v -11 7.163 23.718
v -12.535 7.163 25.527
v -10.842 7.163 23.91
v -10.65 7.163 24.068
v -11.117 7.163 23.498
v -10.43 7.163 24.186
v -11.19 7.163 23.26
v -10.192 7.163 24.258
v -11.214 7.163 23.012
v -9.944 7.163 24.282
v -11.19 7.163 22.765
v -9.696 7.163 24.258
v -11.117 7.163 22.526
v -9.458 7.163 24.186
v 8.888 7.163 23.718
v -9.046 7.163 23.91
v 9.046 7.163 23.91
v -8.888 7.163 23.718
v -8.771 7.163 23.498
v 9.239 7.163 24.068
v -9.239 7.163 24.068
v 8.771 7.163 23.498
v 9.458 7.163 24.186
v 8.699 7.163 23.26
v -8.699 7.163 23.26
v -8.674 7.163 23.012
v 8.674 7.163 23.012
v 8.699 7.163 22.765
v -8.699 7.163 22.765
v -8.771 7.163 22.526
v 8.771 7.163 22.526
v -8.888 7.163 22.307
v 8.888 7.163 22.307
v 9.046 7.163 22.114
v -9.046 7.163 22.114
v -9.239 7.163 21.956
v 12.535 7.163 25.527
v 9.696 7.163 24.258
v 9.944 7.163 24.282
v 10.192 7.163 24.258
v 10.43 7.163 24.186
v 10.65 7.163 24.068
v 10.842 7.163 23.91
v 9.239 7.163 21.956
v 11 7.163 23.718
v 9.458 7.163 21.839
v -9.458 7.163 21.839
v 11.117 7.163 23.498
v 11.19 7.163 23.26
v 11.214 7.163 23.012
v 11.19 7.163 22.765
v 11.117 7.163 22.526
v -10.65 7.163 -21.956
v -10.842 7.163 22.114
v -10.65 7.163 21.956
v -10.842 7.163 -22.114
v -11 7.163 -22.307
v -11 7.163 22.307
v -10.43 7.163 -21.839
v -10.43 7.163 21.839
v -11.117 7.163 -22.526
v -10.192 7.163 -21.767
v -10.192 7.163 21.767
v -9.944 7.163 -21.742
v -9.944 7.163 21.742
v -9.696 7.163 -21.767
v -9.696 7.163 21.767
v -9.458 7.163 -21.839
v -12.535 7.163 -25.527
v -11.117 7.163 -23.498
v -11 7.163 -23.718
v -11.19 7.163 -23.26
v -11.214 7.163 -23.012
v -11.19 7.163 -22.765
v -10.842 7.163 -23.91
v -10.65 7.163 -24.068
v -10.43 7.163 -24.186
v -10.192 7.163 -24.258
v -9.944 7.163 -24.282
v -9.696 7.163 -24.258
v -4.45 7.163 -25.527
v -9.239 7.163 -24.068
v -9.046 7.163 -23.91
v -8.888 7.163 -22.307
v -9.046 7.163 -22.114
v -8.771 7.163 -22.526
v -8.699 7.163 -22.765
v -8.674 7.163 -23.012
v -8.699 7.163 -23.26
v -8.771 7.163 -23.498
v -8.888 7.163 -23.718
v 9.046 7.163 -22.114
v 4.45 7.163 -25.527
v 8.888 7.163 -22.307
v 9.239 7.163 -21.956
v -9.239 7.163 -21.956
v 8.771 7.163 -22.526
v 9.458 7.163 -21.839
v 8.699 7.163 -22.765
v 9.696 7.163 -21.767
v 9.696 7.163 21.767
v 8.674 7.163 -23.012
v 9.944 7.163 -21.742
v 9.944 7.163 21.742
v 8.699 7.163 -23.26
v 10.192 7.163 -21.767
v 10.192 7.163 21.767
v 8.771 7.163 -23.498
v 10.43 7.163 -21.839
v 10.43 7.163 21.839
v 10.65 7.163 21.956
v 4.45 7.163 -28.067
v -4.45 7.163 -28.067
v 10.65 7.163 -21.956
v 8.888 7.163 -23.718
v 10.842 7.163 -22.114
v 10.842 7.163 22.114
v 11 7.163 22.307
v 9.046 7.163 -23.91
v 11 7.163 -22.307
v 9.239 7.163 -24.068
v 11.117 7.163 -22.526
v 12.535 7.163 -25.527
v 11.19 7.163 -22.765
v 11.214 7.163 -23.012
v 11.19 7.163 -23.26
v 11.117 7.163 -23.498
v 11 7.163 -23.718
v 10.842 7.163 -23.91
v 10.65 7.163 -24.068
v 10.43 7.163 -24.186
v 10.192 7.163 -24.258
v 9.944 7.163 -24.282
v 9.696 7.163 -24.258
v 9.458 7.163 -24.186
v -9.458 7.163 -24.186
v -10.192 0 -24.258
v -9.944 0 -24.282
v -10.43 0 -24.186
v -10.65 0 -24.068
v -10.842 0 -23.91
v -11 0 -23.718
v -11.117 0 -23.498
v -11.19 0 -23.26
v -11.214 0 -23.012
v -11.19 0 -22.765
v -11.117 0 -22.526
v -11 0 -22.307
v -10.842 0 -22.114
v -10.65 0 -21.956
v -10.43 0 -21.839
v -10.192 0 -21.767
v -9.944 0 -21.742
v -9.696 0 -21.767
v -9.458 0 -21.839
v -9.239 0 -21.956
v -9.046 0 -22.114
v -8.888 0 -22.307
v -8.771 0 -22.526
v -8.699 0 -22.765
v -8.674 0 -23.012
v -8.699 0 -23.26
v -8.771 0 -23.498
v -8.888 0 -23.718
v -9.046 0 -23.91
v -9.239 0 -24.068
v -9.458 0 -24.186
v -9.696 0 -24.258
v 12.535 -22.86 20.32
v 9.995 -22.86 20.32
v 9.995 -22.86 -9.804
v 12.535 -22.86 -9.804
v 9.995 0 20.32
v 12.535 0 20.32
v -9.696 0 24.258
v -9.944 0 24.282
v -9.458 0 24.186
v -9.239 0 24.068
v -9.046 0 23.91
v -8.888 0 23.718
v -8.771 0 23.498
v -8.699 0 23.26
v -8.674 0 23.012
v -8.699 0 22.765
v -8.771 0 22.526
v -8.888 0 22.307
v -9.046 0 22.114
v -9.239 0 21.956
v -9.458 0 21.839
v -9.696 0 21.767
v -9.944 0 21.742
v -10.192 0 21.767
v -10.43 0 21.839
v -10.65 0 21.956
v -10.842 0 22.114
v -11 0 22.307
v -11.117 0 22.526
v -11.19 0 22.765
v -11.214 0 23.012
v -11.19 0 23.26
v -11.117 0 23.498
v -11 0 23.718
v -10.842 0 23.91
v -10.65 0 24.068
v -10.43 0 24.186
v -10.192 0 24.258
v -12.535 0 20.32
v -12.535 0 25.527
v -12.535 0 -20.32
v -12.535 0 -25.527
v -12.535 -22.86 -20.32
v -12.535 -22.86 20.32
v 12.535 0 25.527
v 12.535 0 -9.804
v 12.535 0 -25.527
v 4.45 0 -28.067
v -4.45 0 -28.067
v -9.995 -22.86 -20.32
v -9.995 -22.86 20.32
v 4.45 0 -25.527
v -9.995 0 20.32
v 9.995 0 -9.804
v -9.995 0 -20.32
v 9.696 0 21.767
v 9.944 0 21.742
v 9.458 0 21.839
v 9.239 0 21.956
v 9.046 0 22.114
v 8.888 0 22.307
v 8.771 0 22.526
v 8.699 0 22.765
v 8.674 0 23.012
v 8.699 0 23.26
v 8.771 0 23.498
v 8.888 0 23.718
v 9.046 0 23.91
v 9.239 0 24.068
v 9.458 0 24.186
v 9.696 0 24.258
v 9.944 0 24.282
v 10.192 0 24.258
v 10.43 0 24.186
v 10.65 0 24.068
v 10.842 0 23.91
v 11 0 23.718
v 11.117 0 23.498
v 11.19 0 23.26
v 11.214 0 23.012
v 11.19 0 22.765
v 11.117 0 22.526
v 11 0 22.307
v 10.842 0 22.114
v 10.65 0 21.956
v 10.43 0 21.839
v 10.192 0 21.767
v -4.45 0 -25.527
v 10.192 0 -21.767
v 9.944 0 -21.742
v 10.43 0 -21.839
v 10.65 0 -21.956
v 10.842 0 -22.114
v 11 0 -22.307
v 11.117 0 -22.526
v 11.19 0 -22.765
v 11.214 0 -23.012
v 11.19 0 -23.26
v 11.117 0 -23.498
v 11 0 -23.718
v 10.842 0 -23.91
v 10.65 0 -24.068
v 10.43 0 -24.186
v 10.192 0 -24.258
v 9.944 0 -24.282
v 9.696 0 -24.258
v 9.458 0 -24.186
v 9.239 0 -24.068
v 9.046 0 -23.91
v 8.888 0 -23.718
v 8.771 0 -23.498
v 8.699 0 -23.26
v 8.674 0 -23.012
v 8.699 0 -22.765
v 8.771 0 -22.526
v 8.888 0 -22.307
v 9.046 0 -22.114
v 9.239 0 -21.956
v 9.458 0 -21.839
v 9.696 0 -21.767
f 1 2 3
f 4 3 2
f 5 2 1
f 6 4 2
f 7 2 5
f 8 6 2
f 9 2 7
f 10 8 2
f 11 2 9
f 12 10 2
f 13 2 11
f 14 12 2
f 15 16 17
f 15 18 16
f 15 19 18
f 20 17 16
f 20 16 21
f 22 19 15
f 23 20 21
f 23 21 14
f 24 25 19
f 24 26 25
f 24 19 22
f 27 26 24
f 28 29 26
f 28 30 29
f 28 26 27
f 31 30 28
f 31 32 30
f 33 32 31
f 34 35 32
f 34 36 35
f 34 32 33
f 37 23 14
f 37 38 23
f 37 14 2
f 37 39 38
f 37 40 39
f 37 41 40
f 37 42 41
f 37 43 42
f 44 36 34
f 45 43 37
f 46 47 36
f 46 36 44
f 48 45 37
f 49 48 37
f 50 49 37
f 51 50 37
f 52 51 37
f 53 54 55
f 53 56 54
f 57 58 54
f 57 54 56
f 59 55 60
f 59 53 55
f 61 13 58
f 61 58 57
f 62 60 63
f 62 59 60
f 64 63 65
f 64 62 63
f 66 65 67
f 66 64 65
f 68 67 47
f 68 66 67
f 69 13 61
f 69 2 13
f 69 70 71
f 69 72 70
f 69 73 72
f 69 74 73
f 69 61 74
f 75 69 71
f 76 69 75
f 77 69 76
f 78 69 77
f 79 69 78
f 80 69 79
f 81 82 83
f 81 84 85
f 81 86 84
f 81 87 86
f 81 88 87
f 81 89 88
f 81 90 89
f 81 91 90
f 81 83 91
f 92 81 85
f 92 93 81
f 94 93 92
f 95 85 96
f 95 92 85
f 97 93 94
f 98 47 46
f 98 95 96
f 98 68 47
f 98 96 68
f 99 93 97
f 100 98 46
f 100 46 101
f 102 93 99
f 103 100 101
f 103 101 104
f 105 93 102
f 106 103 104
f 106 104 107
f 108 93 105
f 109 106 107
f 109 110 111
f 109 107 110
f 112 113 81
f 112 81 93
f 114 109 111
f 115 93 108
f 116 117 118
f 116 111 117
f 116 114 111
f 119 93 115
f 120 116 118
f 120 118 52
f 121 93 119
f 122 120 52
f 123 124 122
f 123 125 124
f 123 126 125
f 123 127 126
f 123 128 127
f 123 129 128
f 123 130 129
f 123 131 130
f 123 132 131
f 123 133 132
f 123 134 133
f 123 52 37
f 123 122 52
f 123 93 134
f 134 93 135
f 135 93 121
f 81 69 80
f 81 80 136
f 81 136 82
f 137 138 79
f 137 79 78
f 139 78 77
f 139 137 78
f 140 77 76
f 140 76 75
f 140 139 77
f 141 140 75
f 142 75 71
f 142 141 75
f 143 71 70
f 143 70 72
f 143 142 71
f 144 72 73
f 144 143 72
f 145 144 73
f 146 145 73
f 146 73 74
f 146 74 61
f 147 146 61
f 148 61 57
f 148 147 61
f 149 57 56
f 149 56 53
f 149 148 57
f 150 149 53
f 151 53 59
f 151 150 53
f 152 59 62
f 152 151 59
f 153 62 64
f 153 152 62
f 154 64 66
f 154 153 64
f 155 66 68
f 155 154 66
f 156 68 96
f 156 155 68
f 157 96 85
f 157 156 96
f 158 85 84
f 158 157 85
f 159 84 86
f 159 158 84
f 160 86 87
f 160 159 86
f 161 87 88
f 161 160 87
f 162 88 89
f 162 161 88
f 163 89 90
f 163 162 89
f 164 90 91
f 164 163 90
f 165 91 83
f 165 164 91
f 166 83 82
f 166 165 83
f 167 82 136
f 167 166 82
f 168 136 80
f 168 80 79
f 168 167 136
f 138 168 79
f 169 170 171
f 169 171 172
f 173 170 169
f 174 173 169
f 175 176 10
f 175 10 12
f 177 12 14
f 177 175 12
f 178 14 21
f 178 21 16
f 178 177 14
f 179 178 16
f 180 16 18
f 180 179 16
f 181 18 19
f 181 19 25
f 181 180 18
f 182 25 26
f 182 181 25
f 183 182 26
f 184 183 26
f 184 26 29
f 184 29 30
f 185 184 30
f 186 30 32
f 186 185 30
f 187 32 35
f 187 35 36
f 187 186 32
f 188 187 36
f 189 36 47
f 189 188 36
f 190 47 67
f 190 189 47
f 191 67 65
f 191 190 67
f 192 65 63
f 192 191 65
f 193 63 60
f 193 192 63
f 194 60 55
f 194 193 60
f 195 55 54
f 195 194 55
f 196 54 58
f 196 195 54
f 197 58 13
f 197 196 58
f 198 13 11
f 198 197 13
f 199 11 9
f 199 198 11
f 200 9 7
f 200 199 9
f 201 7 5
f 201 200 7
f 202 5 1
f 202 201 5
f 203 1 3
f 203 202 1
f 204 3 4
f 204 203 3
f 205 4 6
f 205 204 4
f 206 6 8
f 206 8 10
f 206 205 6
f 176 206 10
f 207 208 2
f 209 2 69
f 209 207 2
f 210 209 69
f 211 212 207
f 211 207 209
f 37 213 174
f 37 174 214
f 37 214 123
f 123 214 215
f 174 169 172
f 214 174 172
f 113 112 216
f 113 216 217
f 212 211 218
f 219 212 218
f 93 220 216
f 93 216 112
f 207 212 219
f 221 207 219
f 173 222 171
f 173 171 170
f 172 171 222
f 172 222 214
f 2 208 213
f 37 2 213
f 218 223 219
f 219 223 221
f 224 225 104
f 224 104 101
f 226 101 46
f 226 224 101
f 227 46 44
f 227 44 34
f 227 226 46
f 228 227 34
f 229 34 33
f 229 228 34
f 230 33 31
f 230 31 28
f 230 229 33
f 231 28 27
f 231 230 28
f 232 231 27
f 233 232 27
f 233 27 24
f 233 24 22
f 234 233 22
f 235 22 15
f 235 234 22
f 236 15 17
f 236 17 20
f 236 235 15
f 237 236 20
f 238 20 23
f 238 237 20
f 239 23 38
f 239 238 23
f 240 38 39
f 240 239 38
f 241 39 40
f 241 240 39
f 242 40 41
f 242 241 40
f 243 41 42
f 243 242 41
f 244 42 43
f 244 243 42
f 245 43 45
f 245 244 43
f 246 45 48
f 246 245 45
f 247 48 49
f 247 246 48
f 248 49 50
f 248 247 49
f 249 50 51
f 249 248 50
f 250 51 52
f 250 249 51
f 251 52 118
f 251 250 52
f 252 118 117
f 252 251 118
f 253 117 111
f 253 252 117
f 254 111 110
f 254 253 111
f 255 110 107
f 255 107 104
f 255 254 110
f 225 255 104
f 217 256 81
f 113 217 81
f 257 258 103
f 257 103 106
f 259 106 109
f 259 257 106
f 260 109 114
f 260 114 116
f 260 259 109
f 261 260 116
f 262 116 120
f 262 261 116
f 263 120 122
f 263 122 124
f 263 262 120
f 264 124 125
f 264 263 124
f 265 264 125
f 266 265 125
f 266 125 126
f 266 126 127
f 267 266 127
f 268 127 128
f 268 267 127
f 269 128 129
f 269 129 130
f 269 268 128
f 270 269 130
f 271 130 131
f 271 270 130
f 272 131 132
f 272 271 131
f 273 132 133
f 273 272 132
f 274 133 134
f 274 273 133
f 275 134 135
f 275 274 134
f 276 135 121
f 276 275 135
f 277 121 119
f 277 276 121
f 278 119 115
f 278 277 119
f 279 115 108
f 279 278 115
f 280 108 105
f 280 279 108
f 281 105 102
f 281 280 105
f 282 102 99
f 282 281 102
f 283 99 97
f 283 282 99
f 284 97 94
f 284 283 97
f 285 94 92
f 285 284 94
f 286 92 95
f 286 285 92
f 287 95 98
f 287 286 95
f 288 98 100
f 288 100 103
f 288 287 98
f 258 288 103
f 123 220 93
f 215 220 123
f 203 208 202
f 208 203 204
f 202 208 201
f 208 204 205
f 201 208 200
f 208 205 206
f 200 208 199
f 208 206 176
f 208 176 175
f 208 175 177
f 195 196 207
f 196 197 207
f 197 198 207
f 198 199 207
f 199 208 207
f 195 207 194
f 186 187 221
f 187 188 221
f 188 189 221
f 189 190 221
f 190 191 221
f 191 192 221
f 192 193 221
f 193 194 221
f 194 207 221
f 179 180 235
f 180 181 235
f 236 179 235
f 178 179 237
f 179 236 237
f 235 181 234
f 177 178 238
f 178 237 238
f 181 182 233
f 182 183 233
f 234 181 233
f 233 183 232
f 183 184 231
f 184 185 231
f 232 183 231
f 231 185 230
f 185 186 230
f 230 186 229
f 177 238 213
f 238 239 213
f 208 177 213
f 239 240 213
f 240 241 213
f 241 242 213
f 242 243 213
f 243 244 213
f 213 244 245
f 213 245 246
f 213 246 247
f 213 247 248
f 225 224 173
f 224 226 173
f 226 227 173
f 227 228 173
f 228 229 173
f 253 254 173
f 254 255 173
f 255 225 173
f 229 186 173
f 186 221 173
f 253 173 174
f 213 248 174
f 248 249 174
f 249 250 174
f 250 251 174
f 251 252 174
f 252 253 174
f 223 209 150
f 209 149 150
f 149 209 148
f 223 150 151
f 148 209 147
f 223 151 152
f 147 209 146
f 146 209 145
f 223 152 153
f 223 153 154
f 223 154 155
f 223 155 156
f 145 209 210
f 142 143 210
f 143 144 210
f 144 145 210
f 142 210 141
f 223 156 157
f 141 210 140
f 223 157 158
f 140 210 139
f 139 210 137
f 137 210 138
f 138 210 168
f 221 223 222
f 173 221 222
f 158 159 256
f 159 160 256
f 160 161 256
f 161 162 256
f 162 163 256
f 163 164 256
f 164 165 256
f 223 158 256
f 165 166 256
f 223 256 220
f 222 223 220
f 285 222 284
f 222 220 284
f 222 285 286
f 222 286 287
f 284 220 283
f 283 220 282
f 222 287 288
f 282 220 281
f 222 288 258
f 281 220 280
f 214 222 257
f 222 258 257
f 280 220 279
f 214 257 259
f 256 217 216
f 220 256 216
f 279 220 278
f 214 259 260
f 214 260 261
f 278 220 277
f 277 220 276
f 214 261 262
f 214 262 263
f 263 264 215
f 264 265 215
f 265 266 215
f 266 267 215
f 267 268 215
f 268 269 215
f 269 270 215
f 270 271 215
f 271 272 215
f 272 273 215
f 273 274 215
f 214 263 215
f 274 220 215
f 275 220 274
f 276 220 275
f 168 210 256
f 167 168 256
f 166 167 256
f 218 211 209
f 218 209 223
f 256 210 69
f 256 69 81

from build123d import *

# Parameters (mm, degrees)
SKETCH1_W           = 25.0698
SKETCH1_H           = 51.054
SKETCH1_R           = 1.27
BOSS_EXTRUDE1_DEPTH = 7.1628
SKETCH2_W           = 2.54
SKETCH2_H           = 40.64
SKETCH2_H_2         = 30.1244
BOSS_EXTRUDE2_DEPTH = 22.86
SKETCH3_W           = 8.9
SKETCH3_H           = 7.1628
BOSS_EXTRUDE3_DEPTH = 2.54


with BuildPart() as part:
    # Sketch1 → Boss-Extrude1 (new body)
    with BuildSketch(Plane(origin=(0, 0, 0), x_dir=(1, 0, 0), z_dir=(0, 1, 0))):
        Rectangle(SKETCH1_W, SKETCH1_H)
        with Locations(Location((9.9441, 23.0124, 0), (0, 0, 270))):
            Circle(SKETCH1_R, mode=Mode.SUBTRACT)
        with Locations(Location((-9.9441, 23.0124, 0), (0, 0, 90))):
            Circle(SKETCH1_R, mode=Mode.SUBTRACT)
        with Locations(Location((9.9441, -23.0124, 0), (0, 0, 90))):
            Circle(SKETCH1_R, mode=Mode.SUBTRACT)
        with Locations(Location((-9.9441, -23.0124, 0), (0, 0, 270))):
            Circle(SKETCH1_R, mode=Mode.SUBTRACT)
    extrude(amount=BOSS_EXTRUDE1_DEPTH)

    # Sketch2 → Boss-Extrude2 (add)
    with BuildSketch(Plane.XZ):
        with Locations((-11.2649, 0)):
            Rectangle(SKETCH2_W, SKETCH2_H)
        with Locations((11.2649, 5.2578)):
            Rectangle(SKETCH2_W, SKETCH2_H_2)
    extrude(amount=BOSS_EXTRUDE2_DEPTH)

    # Sketch3 → Boss-Extrude3 (add)
    with BuildSketch(Plane(origin=(0, 0, -25.527), x_dir=(-1, 0, 0), z_dir=(0, 0, -1))):
        with Locations((0, 3.5814)):
            Rectangle(SKETCH3_W, SKETCH3_H)
    extrude(amount=BOSS_EXTRUDE3_DEPTH)


solid = part.part
